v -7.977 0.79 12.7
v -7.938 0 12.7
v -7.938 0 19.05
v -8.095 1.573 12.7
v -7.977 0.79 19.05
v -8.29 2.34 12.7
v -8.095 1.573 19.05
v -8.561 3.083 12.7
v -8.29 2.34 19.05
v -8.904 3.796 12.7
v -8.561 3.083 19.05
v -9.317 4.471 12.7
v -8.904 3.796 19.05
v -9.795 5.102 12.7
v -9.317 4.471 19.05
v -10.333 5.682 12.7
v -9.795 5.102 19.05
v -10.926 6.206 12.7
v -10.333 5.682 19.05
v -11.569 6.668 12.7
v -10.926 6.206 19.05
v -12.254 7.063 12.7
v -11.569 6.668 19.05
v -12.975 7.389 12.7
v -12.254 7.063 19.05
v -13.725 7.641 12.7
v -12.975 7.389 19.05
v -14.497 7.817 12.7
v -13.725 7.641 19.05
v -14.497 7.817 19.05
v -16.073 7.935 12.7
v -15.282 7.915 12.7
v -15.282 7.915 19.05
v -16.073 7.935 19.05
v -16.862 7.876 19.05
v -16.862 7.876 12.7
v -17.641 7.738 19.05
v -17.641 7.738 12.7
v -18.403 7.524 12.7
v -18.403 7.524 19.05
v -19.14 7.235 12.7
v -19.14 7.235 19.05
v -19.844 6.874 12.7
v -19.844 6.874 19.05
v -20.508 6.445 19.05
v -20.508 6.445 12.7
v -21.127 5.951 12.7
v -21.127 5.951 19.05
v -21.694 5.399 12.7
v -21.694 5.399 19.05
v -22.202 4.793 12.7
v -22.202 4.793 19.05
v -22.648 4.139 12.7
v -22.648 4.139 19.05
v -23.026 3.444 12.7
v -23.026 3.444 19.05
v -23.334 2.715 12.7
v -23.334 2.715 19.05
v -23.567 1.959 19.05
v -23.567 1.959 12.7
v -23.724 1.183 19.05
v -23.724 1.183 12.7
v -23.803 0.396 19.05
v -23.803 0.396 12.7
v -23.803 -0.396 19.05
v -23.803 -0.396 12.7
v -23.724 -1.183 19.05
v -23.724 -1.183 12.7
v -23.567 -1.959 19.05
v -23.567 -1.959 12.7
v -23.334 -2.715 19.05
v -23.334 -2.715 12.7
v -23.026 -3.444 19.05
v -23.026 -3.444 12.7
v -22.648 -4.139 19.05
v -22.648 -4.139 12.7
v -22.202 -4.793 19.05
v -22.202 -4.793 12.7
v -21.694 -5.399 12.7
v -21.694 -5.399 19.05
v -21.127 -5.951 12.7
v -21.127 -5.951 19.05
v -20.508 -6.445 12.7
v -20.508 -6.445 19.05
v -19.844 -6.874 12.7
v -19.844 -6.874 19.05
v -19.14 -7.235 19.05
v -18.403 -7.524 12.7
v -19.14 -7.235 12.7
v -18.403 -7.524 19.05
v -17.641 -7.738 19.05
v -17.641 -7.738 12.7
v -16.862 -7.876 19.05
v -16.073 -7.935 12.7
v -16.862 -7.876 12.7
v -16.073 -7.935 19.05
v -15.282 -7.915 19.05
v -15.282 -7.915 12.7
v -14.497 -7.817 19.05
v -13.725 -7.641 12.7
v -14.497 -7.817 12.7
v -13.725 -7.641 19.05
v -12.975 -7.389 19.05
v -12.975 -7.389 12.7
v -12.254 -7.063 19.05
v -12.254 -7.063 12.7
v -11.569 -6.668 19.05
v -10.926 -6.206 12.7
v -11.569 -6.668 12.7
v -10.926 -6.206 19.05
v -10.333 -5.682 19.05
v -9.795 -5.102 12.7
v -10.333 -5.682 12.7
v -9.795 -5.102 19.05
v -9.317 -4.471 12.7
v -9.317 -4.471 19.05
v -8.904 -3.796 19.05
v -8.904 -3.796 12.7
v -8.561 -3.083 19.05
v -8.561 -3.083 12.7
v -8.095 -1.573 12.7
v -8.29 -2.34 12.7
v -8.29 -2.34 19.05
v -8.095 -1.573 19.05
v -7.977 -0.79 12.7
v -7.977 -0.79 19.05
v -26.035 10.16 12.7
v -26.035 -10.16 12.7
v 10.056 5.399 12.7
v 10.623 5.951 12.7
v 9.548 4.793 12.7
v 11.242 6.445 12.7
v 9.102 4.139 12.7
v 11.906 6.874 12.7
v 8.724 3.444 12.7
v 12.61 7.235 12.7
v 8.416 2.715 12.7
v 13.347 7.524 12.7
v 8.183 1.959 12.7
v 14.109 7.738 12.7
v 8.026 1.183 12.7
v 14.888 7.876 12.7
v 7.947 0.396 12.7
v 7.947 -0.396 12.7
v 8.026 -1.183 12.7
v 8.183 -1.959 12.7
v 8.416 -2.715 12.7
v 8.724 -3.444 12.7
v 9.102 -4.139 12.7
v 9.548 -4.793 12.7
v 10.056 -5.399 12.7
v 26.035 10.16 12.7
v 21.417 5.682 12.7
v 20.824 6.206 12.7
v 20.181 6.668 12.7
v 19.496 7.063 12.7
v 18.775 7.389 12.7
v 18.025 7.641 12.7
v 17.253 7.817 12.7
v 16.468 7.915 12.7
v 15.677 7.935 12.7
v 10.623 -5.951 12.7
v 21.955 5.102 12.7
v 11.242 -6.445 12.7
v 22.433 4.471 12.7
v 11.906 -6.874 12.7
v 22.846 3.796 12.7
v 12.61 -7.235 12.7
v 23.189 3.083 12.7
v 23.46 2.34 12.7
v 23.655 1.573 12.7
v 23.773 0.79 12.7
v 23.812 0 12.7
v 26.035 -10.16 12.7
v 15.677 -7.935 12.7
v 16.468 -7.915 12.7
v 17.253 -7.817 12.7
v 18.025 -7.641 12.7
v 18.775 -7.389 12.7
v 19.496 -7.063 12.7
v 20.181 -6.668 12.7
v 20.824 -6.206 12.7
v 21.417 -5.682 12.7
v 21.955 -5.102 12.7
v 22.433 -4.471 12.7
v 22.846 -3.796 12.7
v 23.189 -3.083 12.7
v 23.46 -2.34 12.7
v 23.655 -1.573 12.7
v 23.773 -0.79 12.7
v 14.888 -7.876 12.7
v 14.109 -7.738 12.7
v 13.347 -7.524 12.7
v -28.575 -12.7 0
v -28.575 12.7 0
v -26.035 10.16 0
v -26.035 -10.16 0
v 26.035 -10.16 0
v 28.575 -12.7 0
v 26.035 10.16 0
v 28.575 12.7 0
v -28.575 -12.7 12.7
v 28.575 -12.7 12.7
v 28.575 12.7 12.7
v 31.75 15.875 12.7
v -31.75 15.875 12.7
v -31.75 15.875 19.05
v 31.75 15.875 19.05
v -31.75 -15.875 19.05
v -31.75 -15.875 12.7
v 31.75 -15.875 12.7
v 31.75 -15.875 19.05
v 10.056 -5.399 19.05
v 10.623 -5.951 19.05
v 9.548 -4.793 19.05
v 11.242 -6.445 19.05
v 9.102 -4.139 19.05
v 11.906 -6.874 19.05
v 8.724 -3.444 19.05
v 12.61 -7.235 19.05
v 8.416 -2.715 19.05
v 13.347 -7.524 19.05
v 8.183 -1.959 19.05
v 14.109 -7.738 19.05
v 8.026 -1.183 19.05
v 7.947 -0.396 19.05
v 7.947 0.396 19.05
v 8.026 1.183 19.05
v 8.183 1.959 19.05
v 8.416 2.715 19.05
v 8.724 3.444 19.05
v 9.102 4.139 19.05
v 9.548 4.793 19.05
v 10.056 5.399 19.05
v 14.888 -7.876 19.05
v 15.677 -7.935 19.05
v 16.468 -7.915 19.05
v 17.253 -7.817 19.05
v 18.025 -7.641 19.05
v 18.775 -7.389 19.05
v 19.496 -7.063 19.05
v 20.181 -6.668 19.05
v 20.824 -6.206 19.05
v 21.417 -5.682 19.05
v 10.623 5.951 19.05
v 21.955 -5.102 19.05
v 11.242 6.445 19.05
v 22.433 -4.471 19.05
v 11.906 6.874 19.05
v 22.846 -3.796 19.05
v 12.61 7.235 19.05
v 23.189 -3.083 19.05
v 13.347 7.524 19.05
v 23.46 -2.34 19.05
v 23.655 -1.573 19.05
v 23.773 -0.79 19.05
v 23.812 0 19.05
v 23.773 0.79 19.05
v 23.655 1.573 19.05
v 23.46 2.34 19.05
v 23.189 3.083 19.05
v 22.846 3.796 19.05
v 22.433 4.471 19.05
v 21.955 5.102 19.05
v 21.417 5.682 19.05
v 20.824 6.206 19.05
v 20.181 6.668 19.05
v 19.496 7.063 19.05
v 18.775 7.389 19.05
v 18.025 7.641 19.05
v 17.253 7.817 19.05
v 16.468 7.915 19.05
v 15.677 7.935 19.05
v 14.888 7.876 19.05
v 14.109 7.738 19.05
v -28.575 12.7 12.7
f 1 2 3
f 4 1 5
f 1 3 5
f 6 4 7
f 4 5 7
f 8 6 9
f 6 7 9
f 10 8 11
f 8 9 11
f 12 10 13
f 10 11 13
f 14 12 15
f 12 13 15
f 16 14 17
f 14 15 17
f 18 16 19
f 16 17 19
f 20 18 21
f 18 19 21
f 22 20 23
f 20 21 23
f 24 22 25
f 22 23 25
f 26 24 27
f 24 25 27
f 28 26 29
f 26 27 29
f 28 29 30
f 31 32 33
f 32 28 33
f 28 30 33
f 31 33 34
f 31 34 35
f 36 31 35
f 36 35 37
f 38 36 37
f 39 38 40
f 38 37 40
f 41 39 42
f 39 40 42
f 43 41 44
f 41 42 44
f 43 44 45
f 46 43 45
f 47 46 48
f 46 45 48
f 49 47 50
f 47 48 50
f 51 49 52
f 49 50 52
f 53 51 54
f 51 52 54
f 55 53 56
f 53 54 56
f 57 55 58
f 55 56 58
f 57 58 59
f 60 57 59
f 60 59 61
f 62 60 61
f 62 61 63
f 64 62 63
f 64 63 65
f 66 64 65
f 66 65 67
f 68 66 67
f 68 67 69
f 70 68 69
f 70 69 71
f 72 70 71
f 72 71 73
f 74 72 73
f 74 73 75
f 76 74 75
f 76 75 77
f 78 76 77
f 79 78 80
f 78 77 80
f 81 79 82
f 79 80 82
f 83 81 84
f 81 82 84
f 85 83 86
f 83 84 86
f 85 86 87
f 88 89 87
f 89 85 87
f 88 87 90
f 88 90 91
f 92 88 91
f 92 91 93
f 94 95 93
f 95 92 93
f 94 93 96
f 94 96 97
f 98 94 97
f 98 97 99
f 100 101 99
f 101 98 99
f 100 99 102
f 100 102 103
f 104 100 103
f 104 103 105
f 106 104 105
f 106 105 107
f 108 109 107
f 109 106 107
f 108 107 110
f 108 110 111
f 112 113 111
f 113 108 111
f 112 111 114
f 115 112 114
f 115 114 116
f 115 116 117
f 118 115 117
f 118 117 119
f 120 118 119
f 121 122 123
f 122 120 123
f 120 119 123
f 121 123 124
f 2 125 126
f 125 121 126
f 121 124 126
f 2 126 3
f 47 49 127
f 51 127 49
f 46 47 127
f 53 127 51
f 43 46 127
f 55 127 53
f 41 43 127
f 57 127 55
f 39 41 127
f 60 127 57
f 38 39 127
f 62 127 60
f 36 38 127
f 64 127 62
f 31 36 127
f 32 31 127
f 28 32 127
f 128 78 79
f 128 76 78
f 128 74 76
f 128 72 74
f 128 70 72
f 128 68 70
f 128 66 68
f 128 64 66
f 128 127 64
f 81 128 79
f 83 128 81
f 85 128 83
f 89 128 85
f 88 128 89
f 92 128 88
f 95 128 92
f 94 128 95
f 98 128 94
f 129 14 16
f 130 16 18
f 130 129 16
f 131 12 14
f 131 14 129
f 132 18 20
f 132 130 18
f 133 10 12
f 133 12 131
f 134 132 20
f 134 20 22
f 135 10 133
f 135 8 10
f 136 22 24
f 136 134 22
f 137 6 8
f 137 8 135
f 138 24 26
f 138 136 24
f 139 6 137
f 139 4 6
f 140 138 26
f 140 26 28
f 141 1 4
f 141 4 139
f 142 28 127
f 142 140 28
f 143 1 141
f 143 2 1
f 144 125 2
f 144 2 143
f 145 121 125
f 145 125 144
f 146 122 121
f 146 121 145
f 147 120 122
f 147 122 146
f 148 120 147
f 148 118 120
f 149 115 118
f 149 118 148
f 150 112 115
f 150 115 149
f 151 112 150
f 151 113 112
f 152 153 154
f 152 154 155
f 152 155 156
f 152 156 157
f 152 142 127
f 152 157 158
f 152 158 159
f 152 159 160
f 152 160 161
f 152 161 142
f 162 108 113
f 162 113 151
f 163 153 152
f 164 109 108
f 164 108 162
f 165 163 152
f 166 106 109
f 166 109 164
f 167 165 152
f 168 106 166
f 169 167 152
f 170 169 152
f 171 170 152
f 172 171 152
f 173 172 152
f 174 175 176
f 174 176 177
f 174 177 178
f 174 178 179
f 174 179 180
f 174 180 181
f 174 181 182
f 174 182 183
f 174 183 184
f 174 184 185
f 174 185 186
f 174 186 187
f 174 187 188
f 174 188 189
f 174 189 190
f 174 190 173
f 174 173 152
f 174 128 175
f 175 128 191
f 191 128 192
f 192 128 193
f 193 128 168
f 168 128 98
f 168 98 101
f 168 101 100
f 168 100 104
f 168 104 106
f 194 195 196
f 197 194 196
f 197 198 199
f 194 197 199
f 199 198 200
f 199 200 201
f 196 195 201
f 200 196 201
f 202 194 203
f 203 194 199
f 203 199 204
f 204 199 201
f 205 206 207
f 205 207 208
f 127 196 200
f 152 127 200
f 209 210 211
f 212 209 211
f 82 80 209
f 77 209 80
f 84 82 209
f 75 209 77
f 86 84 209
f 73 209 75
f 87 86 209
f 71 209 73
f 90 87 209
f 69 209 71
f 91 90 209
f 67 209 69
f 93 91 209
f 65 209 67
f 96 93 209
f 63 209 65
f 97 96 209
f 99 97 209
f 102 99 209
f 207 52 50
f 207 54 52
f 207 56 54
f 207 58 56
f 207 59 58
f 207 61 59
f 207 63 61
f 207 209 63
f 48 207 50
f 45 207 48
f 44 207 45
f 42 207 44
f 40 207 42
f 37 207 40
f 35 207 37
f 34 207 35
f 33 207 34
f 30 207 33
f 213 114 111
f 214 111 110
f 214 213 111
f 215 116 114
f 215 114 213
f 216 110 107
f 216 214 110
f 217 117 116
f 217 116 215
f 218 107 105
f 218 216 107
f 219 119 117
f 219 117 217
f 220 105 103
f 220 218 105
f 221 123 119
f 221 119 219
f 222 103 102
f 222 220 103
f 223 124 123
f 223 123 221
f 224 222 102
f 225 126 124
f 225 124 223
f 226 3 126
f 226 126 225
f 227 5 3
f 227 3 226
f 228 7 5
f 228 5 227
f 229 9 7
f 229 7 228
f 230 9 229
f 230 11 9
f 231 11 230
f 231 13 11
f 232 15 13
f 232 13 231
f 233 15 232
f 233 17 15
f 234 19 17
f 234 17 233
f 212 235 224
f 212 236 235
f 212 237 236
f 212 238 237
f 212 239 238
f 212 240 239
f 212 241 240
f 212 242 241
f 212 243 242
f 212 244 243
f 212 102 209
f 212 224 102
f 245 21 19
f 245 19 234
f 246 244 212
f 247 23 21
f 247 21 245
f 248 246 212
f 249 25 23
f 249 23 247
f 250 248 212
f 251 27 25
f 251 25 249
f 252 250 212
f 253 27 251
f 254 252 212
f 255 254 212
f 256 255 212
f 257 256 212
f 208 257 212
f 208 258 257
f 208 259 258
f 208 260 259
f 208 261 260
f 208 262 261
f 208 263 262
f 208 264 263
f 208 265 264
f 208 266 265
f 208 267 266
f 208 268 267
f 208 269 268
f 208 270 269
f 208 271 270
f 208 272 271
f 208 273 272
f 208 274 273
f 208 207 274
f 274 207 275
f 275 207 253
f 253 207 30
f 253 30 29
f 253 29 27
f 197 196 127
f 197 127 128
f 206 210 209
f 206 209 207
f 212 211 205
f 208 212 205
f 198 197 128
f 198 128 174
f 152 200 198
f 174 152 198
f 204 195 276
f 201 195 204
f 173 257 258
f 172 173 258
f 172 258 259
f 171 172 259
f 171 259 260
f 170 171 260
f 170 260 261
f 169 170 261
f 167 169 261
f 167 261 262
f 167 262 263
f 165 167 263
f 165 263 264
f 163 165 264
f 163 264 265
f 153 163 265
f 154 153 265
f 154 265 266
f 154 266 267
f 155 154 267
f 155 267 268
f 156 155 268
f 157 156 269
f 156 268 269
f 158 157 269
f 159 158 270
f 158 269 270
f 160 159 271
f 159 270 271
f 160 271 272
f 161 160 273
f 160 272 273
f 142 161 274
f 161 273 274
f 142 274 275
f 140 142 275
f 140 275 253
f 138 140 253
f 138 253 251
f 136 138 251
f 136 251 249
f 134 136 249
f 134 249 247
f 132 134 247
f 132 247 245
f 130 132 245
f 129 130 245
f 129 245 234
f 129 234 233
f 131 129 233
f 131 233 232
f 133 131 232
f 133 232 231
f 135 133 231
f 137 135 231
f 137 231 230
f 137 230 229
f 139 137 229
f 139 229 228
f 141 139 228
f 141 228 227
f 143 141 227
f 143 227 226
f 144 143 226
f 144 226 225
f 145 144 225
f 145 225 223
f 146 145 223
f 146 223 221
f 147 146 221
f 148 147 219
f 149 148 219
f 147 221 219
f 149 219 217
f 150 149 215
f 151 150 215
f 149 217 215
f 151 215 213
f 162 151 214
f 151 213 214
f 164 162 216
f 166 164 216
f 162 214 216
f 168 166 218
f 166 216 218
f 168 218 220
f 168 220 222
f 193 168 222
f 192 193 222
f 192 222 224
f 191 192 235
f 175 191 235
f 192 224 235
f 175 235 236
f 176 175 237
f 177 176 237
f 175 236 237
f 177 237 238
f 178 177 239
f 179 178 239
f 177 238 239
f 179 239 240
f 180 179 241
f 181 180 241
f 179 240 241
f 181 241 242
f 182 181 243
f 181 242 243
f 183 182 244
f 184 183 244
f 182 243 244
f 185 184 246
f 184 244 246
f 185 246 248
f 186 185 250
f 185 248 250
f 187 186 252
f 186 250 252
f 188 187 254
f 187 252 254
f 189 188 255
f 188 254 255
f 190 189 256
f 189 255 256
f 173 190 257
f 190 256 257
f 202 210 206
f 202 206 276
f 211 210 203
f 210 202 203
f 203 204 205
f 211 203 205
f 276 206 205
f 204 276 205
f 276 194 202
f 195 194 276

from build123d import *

# Parameters (mm, degrees)
F0_W     = 57.15
F0_H     = 25.4
F1_DEPTH = 12.7
F2_W     = 63.5
F2_H     = 31.75
F2_W_2   = 57.15
F2_H_2   = 25.4
F3_DEPTH = 6.35
F4_R     = 7.9375
F5_DEPTH = 19.051
F6_W     = 52.07
F6_H     = 20.32
F6_R     = 7.9375
F7_DEPTH = 12.7


with BuildPart() as f1:
    # F0 (on Top) → F1 (new body)
    with BuildSketch(Plane.XY):
        Rectangle(F0_W, F0_H)
    extrude(amount=F1_DEPTH)

    # F2 (on face) → F3 (join)
    with BuildSketch(Plane.XY.offset(12.7)):
        Rectangle(F2_W, F2_H)
        Rectangle(F2_W_2, F2_H_2, mode=Mode.SUBTRACT)
        Rectangle(F2_W_2, F2_H_2)
    extrude(amount=F3_DEPTH)

    # F4 (on face) → F5 (cut, through all)
    with BuildSketch(Plane.XY.offset(19.05)):
        with Locations((-15.875, 0)):
            Circle(F4_R)
        with Locations((15.875, 0)):
            Circle(F4_R)
    extrude(amount=-F5_DEPTH, mode=Mode.SUBTRACT)

    # F6 (on face) → F7 (cut)
    with BuildSketch(Plane(origin=(0, 0, 0), x_dir=(1, 0, 0), z_dir=(0, 0, -1))):
        Rectangle(F6_W, F6_H)
        with Locations((-15.875, 0)):
            Circle(F6_R, mode=Mode.SUBTRACT)
        with Locations((15.875, 0)):
            Circle(F6_R, mode=Mode.SUBTRACT)
        with Locations((15.875, 0)):
            Circle(F6_R)
    extrude(amount=-F7_DEPTH, mode=Mode.SUBTRACT)


solid = f1.part
